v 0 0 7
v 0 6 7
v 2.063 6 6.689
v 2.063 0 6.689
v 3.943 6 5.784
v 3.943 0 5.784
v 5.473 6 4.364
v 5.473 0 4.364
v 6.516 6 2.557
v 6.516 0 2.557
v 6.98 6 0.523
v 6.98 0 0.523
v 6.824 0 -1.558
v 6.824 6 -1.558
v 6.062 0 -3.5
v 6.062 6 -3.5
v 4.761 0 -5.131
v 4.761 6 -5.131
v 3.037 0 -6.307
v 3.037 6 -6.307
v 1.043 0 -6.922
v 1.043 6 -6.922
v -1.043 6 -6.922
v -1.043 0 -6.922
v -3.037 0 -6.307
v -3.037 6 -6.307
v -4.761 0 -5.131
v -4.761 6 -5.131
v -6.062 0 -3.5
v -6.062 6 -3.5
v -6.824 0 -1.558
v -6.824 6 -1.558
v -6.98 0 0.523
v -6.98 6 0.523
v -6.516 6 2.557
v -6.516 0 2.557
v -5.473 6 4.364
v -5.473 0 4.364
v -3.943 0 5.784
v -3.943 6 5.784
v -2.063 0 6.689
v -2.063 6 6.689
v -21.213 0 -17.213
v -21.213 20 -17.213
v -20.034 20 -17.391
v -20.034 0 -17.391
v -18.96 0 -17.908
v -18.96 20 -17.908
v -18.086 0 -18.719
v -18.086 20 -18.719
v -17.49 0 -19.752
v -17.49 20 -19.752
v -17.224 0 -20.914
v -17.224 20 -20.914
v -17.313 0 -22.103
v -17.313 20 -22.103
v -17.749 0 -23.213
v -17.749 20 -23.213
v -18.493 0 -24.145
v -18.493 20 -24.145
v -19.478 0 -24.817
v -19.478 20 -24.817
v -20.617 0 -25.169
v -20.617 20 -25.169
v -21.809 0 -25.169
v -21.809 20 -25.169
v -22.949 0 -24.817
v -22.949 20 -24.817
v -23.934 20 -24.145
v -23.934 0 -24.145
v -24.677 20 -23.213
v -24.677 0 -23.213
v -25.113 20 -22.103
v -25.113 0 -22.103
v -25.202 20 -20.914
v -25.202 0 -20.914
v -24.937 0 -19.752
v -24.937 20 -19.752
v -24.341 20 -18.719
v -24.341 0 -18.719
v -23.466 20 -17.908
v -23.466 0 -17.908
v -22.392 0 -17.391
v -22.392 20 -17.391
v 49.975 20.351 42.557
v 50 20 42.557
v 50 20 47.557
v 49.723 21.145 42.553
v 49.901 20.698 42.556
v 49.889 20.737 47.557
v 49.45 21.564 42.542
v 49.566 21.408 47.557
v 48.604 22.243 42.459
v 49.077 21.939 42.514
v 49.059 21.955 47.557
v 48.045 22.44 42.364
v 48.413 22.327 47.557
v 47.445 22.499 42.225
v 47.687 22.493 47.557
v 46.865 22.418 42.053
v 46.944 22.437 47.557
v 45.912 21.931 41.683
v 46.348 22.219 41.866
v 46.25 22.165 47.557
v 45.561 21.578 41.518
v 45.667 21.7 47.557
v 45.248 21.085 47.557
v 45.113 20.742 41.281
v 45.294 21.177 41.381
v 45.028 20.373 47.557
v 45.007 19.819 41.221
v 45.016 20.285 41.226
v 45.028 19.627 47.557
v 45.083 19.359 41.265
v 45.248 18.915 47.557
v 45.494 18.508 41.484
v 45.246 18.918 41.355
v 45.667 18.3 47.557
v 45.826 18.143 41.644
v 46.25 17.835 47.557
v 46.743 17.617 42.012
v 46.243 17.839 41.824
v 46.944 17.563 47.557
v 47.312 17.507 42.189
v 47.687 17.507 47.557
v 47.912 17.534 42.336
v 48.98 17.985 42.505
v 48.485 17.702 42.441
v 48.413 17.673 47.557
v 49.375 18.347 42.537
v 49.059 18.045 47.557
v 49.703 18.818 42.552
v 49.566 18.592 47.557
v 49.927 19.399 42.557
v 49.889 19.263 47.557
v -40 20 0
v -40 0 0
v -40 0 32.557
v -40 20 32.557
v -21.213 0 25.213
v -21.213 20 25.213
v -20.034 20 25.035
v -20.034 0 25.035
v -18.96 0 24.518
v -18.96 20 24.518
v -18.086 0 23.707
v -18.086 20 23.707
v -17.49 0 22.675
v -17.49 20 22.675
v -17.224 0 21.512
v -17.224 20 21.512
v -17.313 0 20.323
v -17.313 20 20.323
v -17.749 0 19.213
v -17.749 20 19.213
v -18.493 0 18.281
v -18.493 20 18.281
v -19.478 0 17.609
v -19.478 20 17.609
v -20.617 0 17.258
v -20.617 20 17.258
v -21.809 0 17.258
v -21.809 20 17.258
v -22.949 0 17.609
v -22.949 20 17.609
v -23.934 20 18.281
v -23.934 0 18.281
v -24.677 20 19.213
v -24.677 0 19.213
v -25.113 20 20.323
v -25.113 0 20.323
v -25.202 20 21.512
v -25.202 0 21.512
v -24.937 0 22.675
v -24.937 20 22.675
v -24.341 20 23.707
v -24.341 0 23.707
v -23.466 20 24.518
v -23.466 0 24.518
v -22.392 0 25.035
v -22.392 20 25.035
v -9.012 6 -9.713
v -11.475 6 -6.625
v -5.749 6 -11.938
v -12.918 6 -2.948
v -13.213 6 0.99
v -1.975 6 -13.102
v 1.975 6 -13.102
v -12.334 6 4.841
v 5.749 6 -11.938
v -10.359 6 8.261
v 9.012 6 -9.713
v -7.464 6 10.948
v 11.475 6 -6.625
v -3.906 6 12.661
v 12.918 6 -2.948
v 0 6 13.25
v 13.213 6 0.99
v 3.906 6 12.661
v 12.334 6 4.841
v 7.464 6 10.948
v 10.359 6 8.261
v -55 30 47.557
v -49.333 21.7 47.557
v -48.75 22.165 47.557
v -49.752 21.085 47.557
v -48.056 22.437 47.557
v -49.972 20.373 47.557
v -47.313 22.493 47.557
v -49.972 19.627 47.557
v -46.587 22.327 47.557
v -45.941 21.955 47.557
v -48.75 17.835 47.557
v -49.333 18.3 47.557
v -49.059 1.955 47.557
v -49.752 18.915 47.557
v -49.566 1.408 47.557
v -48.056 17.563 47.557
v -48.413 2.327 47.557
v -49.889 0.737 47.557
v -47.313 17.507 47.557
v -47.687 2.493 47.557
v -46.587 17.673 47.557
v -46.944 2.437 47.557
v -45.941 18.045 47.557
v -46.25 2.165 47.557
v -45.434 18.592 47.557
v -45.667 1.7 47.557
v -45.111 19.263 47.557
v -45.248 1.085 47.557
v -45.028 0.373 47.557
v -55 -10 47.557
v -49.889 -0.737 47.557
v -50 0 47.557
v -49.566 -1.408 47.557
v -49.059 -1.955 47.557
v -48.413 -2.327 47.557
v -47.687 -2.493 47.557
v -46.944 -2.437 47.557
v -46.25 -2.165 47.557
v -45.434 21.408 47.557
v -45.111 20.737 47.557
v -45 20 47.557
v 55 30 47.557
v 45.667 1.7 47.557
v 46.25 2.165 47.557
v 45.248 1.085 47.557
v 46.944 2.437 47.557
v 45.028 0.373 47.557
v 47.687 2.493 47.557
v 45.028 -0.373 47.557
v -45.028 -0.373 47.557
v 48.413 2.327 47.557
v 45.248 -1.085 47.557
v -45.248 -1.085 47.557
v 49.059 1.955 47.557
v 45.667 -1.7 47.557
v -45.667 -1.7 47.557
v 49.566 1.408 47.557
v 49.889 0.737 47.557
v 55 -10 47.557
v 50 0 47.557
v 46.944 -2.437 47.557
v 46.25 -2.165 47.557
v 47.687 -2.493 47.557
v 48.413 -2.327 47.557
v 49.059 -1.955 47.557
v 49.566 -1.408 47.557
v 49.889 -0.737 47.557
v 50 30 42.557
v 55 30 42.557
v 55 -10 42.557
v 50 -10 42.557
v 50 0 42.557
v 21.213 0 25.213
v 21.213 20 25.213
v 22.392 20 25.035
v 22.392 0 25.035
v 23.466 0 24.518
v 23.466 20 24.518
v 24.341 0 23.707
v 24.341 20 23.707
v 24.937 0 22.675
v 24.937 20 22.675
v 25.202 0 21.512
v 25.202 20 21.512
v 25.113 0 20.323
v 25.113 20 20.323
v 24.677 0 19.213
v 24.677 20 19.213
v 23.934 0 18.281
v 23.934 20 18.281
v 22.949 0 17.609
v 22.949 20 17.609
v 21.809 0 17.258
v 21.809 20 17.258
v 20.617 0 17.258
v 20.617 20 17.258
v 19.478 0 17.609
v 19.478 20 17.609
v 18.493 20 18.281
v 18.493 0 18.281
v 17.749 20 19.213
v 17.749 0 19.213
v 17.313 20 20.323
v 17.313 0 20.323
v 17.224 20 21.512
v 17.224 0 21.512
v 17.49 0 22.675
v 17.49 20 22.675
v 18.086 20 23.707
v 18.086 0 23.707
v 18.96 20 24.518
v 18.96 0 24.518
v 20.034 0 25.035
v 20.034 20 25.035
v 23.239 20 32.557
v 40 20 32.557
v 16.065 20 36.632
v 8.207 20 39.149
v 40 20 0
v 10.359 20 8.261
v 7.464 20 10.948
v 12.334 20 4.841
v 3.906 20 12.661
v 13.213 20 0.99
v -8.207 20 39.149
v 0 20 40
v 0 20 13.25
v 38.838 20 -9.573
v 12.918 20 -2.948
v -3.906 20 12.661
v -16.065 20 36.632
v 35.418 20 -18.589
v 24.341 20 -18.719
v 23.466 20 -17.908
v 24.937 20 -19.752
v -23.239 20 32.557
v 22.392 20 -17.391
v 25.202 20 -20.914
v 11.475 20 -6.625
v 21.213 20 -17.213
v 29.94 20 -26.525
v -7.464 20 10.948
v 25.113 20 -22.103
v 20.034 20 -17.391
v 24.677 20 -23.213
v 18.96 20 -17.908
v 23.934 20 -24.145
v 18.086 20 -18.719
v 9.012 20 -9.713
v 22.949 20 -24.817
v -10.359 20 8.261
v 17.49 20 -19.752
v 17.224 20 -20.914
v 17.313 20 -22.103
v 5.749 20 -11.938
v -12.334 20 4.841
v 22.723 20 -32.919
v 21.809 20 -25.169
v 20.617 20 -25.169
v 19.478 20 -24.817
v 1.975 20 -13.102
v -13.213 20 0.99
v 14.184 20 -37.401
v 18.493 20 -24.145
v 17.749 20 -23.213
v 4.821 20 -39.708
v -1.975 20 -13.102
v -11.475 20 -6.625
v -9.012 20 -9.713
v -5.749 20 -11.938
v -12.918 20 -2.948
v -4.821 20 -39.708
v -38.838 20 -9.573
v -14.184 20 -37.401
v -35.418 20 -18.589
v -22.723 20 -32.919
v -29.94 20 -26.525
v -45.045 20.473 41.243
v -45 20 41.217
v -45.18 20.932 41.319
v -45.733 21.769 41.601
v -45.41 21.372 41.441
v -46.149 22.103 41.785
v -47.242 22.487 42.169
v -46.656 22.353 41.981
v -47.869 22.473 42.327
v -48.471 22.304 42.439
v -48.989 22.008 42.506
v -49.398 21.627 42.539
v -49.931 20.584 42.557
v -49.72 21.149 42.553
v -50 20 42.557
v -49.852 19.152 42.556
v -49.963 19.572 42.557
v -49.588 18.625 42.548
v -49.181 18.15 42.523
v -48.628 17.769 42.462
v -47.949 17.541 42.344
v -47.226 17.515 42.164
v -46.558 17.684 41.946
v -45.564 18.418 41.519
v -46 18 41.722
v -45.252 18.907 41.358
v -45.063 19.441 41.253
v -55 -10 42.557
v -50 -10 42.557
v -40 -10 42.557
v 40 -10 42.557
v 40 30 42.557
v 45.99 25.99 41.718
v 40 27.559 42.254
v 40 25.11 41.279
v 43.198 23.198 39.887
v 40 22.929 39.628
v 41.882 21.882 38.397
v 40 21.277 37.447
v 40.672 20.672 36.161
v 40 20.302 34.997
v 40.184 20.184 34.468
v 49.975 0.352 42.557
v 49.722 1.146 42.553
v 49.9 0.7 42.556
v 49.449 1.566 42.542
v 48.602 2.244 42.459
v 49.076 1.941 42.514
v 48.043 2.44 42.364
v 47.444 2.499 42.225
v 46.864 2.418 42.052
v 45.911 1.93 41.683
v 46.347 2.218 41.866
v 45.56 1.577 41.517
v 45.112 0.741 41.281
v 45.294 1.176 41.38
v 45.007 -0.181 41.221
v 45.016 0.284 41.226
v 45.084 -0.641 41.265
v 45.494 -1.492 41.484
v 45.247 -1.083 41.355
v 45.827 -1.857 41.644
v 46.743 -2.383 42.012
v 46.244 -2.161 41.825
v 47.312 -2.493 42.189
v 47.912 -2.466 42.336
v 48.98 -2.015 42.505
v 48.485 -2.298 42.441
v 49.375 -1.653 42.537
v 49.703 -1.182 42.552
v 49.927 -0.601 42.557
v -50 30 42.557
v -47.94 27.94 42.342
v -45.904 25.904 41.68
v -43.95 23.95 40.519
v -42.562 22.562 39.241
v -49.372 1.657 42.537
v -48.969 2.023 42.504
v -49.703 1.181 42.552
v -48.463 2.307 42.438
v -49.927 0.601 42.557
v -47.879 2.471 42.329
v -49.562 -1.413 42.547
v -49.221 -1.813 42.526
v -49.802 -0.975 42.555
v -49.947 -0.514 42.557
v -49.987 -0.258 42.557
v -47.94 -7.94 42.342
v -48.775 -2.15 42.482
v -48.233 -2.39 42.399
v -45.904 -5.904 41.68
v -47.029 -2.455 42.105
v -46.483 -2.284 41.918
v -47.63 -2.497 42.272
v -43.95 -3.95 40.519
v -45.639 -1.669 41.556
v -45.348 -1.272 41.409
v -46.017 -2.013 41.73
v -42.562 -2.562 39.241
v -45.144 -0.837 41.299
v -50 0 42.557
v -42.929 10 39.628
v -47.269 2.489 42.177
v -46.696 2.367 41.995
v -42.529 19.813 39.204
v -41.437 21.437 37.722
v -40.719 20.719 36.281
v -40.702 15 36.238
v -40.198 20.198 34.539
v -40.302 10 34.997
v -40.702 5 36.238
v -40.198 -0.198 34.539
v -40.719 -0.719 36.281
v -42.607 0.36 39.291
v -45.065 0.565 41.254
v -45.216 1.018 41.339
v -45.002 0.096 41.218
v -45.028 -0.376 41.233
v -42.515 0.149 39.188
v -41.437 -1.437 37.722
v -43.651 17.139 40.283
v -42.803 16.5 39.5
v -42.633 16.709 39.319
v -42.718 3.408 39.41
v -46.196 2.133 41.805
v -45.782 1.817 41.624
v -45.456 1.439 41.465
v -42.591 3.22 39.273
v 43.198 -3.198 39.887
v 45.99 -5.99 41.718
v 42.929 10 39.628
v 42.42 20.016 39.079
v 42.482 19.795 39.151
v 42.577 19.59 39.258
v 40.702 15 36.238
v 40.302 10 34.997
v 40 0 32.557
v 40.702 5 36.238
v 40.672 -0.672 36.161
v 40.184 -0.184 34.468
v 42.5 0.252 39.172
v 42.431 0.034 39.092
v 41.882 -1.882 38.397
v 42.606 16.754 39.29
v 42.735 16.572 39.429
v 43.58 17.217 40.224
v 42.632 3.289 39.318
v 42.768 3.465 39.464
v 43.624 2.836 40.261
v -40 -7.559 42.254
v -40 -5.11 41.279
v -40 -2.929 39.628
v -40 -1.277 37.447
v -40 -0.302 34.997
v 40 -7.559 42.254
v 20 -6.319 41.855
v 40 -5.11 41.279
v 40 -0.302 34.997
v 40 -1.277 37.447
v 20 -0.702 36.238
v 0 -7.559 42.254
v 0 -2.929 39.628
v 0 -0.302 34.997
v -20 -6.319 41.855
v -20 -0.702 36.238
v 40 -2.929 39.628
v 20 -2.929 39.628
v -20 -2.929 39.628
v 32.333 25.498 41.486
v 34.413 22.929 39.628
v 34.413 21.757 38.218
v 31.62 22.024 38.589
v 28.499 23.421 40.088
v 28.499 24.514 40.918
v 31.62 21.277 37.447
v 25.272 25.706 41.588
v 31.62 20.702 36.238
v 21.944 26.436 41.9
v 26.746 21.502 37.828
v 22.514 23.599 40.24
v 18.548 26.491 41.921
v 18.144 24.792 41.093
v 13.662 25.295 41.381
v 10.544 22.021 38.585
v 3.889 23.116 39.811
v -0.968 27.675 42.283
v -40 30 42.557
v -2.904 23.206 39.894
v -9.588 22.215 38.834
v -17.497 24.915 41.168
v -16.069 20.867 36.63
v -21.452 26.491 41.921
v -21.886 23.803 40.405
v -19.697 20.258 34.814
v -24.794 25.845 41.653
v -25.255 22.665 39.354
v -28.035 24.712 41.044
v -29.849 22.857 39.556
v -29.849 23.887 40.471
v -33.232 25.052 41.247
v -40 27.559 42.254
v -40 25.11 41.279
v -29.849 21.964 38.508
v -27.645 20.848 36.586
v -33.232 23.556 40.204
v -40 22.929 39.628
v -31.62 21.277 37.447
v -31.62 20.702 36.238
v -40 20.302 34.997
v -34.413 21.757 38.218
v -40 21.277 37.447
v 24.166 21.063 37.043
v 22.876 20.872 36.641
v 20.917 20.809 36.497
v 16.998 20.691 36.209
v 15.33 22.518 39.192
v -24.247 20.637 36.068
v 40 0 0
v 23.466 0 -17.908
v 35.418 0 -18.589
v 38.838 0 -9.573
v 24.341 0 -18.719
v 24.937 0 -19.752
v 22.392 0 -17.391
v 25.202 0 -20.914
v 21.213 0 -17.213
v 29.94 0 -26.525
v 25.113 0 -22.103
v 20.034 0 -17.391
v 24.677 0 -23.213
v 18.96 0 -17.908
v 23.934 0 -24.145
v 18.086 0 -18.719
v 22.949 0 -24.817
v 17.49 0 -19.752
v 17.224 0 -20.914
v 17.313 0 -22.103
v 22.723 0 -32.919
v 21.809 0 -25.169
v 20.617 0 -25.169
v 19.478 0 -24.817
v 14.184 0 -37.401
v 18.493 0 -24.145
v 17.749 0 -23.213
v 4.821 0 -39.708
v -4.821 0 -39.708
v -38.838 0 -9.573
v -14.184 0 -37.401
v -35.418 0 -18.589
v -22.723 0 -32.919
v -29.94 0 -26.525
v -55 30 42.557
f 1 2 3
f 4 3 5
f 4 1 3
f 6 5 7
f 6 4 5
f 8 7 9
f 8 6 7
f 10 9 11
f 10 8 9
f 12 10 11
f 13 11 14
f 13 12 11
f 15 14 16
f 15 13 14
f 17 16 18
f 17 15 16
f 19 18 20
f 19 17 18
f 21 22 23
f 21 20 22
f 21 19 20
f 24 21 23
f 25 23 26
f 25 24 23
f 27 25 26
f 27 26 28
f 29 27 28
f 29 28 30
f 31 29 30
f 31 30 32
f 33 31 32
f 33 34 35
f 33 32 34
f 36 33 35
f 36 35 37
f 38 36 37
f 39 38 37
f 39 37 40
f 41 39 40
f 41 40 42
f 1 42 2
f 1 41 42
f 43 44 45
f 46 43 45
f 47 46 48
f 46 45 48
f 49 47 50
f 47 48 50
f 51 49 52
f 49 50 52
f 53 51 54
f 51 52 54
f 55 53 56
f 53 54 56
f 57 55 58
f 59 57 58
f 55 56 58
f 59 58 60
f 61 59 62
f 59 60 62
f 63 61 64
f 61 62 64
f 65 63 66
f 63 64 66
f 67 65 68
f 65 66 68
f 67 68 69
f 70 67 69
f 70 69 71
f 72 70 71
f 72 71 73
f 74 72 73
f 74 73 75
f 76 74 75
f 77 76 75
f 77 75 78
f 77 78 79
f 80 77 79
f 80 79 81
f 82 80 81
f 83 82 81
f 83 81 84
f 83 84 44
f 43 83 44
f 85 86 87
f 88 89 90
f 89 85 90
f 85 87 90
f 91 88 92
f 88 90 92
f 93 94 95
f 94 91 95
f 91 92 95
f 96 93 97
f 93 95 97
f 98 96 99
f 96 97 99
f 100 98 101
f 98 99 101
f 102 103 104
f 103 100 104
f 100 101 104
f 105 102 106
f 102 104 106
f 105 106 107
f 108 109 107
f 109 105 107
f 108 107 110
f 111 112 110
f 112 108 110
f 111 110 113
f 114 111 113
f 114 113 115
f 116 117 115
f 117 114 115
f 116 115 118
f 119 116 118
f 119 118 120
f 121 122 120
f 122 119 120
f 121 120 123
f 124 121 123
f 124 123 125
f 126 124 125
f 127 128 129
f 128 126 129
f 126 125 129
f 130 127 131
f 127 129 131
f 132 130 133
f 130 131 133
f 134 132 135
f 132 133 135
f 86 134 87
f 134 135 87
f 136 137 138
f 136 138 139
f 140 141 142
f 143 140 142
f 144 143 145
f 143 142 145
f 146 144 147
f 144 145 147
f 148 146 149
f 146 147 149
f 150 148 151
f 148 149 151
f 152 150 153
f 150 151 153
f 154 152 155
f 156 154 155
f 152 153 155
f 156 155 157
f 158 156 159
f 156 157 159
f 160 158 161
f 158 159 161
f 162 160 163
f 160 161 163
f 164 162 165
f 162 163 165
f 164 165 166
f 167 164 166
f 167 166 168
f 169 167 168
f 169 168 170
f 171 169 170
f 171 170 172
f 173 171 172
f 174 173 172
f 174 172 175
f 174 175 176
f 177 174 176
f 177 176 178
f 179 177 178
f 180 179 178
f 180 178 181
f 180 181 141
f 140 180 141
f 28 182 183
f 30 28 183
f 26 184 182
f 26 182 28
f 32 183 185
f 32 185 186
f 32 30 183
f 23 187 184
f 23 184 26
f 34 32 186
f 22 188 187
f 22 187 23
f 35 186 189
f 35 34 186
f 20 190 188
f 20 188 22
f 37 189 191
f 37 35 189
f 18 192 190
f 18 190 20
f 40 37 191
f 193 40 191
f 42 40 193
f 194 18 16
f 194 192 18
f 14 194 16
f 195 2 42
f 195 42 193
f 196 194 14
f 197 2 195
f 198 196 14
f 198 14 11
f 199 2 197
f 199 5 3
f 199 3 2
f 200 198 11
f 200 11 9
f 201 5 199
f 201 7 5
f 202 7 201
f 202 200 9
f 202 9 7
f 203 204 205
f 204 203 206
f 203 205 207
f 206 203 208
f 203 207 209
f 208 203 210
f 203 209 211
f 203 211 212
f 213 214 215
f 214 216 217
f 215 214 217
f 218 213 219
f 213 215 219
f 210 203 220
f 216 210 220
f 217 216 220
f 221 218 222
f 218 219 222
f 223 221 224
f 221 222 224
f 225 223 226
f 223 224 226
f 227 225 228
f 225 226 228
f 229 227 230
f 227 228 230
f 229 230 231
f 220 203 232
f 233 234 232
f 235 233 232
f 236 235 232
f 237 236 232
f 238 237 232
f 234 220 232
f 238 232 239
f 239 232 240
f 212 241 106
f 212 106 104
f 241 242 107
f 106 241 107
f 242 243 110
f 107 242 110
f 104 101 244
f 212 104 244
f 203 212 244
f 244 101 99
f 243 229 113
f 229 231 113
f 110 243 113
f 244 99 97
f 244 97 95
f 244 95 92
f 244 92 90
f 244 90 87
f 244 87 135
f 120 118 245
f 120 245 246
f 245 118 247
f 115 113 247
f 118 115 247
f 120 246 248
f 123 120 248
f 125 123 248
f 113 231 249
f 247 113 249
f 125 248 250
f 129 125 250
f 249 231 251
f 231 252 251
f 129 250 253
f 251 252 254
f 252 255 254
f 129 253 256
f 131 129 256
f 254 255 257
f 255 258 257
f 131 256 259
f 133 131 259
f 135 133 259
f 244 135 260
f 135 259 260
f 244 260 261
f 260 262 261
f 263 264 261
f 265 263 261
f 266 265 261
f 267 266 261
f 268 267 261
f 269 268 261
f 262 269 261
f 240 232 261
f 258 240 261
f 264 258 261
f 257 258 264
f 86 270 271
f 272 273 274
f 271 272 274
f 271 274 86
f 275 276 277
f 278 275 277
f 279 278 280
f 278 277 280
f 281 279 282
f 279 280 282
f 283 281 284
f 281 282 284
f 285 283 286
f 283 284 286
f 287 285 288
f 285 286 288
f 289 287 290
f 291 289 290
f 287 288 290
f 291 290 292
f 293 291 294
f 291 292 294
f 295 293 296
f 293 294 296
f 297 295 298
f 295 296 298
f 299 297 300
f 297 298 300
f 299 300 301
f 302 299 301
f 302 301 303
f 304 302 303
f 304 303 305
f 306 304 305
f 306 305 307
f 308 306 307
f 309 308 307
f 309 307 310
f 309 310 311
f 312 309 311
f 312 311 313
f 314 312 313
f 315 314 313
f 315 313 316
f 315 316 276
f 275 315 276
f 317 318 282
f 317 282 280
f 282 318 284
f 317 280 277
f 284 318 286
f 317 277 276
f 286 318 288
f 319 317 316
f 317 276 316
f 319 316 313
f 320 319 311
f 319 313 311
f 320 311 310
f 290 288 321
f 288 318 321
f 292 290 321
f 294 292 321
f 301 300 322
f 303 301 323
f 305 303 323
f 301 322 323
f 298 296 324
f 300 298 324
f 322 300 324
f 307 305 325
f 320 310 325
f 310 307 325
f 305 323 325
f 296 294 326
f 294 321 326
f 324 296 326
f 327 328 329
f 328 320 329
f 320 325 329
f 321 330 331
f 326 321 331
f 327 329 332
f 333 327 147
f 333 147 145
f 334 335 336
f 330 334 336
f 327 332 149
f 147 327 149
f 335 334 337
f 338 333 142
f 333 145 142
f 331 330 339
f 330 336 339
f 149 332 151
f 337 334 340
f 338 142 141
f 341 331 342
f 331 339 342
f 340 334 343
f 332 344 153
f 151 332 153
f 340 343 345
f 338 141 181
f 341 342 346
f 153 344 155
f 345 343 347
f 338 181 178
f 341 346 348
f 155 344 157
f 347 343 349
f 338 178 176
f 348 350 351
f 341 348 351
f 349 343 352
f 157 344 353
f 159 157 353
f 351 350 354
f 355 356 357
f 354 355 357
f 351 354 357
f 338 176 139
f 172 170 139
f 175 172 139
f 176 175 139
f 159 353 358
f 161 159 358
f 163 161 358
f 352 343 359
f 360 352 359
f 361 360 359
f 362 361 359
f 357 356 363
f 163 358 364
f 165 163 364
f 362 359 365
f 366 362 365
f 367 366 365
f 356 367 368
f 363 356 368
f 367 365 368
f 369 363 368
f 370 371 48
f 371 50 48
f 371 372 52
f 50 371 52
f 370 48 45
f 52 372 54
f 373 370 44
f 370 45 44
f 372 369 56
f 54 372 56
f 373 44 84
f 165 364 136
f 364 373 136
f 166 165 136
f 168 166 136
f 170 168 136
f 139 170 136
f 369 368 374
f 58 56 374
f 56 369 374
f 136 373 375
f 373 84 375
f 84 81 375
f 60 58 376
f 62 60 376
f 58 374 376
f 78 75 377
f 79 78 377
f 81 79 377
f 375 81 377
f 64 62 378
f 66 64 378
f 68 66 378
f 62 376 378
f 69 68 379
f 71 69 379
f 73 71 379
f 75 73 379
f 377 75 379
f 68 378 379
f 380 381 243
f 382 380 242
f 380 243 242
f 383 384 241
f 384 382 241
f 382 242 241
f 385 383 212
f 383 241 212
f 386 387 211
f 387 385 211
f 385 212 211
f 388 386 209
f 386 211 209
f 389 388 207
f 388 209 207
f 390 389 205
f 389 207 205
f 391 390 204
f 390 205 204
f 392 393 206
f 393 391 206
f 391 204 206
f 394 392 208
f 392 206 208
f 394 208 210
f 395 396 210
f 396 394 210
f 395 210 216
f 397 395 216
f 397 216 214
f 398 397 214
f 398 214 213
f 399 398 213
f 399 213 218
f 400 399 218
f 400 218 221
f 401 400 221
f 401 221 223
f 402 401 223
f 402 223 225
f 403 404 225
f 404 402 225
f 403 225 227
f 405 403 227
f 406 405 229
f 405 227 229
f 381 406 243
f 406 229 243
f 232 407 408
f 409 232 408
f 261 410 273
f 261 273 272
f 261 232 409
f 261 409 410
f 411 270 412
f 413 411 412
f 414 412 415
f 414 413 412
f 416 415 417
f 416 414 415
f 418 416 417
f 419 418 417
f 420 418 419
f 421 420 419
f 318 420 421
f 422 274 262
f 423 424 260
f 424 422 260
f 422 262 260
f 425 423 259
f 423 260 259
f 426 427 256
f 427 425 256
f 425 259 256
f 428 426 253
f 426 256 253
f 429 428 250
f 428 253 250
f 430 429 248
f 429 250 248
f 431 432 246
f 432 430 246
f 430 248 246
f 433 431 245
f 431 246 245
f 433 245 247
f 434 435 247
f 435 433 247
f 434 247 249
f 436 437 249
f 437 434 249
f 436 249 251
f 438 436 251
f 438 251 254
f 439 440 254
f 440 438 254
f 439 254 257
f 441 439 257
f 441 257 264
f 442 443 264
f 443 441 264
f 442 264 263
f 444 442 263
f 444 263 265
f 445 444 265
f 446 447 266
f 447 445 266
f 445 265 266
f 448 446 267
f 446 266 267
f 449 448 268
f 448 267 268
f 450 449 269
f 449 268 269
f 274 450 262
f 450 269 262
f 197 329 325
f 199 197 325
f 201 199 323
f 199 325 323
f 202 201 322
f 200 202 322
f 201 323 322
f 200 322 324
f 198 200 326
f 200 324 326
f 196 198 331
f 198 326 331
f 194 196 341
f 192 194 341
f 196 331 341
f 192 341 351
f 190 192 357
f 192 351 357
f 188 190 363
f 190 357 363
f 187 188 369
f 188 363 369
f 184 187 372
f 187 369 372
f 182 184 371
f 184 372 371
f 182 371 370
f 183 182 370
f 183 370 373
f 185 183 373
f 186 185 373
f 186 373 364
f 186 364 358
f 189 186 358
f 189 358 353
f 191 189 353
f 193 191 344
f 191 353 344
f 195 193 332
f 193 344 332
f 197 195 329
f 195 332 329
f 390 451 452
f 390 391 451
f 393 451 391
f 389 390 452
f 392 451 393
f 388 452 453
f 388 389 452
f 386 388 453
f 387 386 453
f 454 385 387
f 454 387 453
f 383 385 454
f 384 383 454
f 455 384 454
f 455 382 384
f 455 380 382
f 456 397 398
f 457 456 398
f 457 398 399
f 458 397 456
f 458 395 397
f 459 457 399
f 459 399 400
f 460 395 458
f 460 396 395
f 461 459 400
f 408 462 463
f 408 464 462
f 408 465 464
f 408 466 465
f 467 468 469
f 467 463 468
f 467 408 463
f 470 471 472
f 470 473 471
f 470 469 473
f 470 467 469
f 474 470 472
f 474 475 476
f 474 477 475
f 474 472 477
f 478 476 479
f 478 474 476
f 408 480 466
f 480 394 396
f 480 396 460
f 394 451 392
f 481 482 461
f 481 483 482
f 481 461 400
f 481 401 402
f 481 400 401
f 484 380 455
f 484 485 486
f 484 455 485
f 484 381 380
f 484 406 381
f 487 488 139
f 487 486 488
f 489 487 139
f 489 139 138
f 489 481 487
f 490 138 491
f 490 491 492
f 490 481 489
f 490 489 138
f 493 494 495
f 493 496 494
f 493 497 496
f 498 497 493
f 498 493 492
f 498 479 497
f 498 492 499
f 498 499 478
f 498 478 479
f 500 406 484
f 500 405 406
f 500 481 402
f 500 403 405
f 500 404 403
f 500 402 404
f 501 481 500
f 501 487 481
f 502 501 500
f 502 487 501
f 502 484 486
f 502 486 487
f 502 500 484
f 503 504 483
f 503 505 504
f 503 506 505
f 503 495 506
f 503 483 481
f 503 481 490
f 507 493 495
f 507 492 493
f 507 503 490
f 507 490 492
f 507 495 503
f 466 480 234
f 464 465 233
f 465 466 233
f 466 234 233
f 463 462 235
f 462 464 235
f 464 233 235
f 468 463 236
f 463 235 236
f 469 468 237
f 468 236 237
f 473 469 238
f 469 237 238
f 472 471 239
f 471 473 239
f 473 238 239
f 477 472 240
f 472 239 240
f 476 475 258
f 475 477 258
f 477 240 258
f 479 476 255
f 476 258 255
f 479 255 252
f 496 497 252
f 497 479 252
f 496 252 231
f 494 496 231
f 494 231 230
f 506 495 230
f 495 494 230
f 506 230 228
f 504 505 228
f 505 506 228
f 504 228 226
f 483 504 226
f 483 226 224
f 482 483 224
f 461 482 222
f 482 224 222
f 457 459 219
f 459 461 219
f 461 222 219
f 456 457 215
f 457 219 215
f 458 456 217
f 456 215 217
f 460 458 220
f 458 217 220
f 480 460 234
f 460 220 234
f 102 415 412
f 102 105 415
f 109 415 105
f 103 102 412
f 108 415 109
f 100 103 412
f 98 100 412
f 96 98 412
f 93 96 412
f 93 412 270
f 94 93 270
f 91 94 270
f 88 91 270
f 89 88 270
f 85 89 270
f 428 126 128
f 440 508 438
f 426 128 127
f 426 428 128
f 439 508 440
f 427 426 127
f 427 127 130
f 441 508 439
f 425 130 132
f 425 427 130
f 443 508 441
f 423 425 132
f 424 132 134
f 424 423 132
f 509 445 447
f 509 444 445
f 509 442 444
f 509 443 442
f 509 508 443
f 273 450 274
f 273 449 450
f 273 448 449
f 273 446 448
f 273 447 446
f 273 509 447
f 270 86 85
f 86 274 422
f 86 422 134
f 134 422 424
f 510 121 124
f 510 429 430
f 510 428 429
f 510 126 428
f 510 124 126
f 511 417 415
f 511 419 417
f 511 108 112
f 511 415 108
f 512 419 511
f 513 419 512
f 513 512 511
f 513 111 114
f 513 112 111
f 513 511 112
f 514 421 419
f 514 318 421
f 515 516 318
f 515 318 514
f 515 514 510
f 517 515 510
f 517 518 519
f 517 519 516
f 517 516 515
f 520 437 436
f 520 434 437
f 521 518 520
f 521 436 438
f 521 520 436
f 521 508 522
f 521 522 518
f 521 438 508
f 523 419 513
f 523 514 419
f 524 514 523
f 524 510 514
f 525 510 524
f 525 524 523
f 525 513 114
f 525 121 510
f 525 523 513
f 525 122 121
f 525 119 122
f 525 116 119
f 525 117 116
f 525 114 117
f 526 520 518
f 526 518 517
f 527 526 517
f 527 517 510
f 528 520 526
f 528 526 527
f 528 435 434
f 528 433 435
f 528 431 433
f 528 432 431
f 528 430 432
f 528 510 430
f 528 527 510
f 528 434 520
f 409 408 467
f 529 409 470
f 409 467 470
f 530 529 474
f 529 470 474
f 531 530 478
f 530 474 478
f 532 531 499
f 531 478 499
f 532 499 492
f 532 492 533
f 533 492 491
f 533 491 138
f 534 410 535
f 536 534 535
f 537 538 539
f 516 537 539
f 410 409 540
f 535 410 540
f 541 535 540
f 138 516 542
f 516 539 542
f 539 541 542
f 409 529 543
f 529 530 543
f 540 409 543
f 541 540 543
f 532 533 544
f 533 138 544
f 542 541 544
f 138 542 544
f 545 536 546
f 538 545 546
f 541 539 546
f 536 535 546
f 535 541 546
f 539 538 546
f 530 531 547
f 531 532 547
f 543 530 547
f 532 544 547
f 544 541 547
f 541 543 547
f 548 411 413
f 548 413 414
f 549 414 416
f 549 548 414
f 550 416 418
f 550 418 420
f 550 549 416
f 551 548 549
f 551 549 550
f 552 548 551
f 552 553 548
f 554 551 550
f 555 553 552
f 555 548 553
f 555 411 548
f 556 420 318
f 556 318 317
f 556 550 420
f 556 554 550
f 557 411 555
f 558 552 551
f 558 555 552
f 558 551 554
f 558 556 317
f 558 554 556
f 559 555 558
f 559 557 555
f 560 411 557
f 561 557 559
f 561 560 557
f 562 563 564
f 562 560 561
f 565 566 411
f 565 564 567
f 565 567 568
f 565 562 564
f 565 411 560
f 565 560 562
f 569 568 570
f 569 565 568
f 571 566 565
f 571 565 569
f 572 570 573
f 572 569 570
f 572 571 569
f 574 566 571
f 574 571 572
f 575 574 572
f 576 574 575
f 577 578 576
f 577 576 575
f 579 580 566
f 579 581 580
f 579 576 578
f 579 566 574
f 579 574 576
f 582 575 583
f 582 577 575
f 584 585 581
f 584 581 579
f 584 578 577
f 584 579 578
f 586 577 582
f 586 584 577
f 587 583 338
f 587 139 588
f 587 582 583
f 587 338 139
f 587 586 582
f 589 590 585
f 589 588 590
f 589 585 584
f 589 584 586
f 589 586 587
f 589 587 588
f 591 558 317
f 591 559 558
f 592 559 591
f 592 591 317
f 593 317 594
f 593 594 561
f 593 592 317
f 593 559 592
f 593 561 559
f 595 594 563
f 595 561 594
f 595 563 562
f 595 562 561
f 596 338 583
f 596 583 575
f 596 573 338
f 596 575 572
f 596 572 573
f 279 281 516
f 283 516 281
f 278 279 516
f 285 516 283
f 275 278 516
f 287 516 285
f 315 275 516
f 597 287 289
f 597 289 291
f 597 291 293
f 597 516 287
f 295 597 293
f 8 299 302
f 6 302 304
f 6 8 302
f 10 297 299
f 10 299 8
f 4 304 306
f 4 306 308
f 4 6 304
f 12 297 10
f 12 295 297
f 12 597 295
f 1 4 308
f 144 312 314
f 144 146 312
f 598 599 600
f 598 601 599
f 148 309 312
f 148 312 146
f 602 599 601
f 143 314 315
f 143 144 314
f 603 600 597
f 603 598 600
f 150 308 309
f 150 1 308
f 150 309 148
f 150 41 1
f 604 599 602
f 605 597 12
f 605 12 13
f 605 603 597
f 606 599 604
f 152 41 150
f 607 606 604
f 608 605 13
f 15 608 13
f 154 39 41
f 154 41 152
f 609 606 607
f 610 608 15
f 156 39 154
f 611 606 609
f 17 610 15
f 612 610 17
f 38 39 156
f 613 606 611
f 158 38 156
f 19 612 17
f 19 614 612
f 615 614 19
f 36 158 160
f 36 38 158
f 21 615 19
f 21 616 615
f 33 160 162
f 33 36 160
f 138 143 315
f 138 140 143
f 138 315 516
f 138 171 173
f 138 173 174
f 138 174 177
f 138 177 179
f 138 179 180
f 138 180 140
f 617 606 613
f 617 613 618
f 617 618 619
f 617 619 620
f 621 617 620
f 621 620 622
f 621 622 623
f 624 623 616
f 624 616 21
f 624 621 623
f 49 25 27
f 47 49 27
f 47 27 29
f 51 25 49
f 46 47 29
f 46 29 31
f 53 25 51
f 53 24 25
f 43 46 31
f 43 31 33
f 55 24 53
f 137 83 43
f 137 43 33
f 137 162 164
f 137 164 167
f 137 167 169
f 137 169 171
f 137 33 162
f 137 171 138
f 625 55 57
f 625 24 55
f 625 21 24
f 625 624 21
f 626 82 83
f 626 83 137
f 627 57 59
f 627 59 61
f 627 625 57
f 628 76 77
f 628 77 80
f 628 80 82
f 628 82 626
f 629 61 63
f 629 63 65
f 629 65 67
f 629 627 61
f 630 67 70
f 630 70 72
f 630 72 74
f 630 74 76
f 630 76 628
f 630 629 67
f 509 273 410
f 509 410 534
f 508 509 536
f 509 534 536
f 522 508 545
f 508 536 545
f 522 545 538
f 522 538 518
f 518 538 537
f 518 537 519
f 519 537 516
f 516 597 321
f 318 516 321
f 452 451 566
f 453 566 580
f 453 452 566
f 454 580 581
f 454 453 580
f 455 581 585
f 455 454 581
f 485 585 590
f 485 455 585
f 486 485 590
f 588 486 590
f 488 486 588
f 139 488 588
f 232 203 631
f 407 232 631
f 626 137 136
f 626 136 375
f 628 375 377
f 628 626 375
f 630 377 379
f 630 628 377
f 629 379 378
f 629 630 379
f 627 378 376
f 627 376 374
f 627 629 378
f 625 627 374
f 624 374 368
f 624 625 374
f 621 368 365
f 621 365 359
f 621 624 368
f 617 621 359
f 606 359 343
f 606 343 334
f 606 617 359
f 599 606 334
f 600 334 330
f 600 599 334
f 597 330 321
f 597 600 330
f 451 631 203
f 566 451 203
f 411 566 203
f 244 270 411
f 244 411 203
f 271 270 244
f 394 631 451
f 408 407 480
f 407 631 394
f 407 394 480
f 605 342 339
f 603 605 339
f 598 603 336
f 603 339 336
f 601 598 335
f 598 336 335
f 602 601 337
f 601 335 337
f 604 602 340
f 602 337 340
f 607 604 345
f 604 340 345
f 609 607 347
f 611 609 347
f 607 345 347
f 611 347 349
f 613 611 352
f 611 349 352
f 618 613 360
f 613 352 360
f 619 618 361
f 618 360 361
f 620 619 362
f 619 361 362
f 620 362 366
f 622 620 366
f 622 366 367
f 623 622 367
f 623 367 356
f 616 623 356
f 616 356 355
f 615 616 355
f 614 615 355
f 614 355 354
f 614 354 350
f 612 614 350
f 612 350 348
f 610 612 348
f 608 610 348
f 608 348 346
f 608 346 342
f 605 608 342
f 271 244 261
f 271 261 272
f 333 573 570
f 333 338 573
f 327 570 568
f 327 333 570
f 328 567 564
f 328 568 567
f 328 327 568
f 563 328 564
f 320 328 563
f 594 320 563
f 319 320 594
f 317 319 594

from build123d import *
from build123d.topology import SkipClean

# Parameters (mm, degrees)
SKETCH1_R           = 7
BOSS_EXTRUDE1_DEPTH = 20
SKETCH2_R           = 13.25
CUT_EXTRUDE1_DEPTH  = 14
SKETCH3_R           = 4
CUT_EXTRUDE2_DEPTH  = 76.40989747
SKETCH4_W           = 110
SKETCH4_H           = 5
BOSS_EXTRUDE2_DEPTH = 10
SKETCH5_W           = 110
SKETCH5_H           = 5
BOSS_EXTRUDE3_DEPTH = 10
FILLET1_START       = -40
FILLET1_DEPTH       = 80
FILLET1_START_2     = -10.0000001
FILLET1_2_DEPTH     = 40.0000001
FILLET1_START_3     = -55.0000001
FILLET1_3_DEPTH     = 110.0000002
SKETCH6_R           = 2.5
CUT_EXTRUDE4_DEPTH  = 108.662433145
SKETCH8_R           = 40
CUT_EXTRUDE5_DEPTH  = 79.655277385


with BuildPart() as part:
    # Sketch1 → Boss-Extrude1 (new body)
    with BuildSketch(Plane(origin=(0, 0, 0), x_dir=(1, 0, 0), z_dir=(0, 1, 0))):
        with BuildLine():
            Line((-55, -42.556835854), (-40, -42.556835854))
            Line((-40, -42.556835854), (-40, 0))
            ThreePointArc((-40, 0), (0, 40), (40, 0))
            Line((40, 0), (40, -42.556835854))
            Line((40, -42.556835854), (55, -42.556835854))
            Line((55, -42.556835854), (55, -47.556835854))
            Line((55, -47.556835854), (-55, -47.556835854))
            Line((-55, -47.556835854), (-55, -42.556835854))
        make_face()
        with Locations(Location((0, 0, 0), (0, 0, 270))):
            Circle(SKETCH1_R, mode=Mode.SUBTRACT)
    extrude(amount=BOSS_EXTRUDE1_DEPTH)

    # Sketch2 → Cut-Extrude1 (cut)
    with BuildSketch(Plane(origin=(0, 20, 0), x_dir=(1, 0, 0), z_dir=(0, 1, 0))):
        with Locations(Location((0, 0, 0), (0, 0, 270))):
            Circle(SKETCH2_R)
    extrude(amount=-CUT_EXTRUDE1_DEPTH, mode=Mode.SUBTRACT)

    # Sketch3 → Cut-Extrude2 (cut, through all)
    with BuildSketch(Plane(origin=(0, 20, 0), x_dir=(1, 0, 0), z_dir=(0, 1, 0))):
        with Locations(Location((-21.213203436, 21.213203436, 0), (0, 0, 270))):
            Circle(SKETCH3_R)
        with Locations(Location((21.213203436, 21.213203436, 0), (0, 0, 270))):
            Circle(SKETCH3_R)
        with Locations(Location((21.213203436, -21.213203436, 0), (0, 0, 270))):
            Circle(SKETCH3_R)
        with Locations(Location((-21.213203436, -21.213203436, 0), (0, 0, 270))):
            Circle(SKETCH3_R)
    extrude(amount=-CUT_EXTRUDE2_DEPTH, mode=Mode.SUBTRACT)

    # Sketch4 → Boss-Extrude2 (add)
    with BuildSketch(Plane.XZ):
        with Locations((0, 45.056835854)):
            Rectangle(SKETCH4_W, SKETCH4_H)
    extrude(amount=BOSS_EXTRUDE2_DEPTH)

    # Sketch5 → Boss-Extrude3 (add)
    with BuildSketch(Plane(origin=(0, 20, 0), x_dir=(1, 0, 0), z_dir=(0, 1, 0))):
        with Locations((0, -45.056835854)):
            Rectangle(SKETCH5_W, SKETCH5_H)
    extrude(amount=BOSS_EXTRUDE3_DEPTH)

    # Fillet1: read off the stored shape, not the designer's step
    # Fillet1 outline → Fillet1 (add)
    with BuildSketch(Plane.YZ.offset(FILLET1_START)):
        with BuildLine():
            Line((0, 42.556835854), (-10, 42.556835854))
            add(Edge.make_bspline(
                [(-10, 42.556835854), (0, 42.556835854), (0, 32.556835854)],
                knots=[0, 0, 0, 1, 1, 1], degree=2, weights=[1, 0.707106781, 1]))
            Line((0, 32.556835854), (0, 42.556835854))
        make_face()
        with BuildLine():
            Line((30, 42.556835854), (20, 42.556835854))
            Line((20, 42.556835854), (20, 32.556835854))
            add(Edge.make_bspline(
                [(30, 42.556835854), (20, 42.556835854), (20, 32.556835854)],
                knots=[0, 0, 0, 1, 1, 1], degree=2, weights=[1, 0.707106781, 1]))
        make_face()
    extrude(amount=FILLET1_DEPTH)

    # Fillet1 2 outline → Fillet1 2 (add)
    with SkipClean():  # the faces are left unmerged after this step: merging them gives an invalid solid
        with BuildSketch(Plane(origin=(0, 0, 0), x_dir=(1, 0, 0), z_dir=(0, 1, 0)).offset(FILLET1_START_2)):
            with BuildLine():
                add(Edge.make_bspline(
                    [(40, -32.556835854), (40, -42.556835854), (50, -42.556835854)],
                    knots=[0, 0, 0, 1, 1, 1], degree=2, weights=[1, 0.707106781, 1]))
                Line((40, -32.556835854), (40, -42.556835854))
                Line((40, -42.556835854), (50, -42.556835854))
            make_face()
            with BuildLine():
                add(Edge.make_bspline(
                    [(-50, -42.556835854), (-40, -42.556835854), (-40, -32.556835854)],
                    knots=[0, 0, 0, 1, 1, 1], degree=2, weights=[1, 0.707106781, 1]))
                Line((-50, -42.556835854), (-40, -42.556835854))
                Line((-40, -42.556835854), (-40, -32.556835854))
            make_face()
        extrude(amount=FILLET1_2_DEPTH)

    # Fillet1 3 outline → Fillet1 3 (cut)
    with BuildSketch(Plane.YZ.offset(FILLET1_START_3)):
        with BuildLine():
            Line((-10, 42.556835854), (-10.0000001, 32.556835854))
            Line((-10.0000001, 32.556835854), (0, 32.556835854))
            add(Edge.make_bspline(
                [(-10, 42.556835854), (0, 42.556835854), (0, 32.556835854)],
                knots=[0, 0, 0, 1, 1, 1], degree=2, weights=[1, 0.707106781, 1]))
        make_face()
        with BuildLine():
            add(Edge.make_bspline(
                [(30, 42.556835854), (20, 42.556835854), (20, 32.556835854)],
                knots=[0, 0, 0, 1, 1, 1], degree=2, weights=[1, 0.707106781, 1]))
            Line((20, 32.556835854), (30, 32.556835854))
            Line((30, 32.556835854), (30, 42.556835854))
        make_face()
    extrude(amount=FILLET1_3_DEPTH, mode=Mode.SUBTRACT)

    # Sketch6 → Cut-Extrude4 (cut, through all)
    with BuildSketch(Plane.XY.offset(47.556835854)):
        with Locations((-47.5, 20)):
            Circle(SKETCH6_R)
        with Locations(Location((-47.5, 0, 0), (0, 0, 180))):
            Circle(SKETCH6_R)
        with Locations((47.5, 0)):
            Circle(SKETCH6_R)
        with Locations((47.5, 20)):
            Circle(SKETCH6_R)
    extrude(amount=-CUT_EXTRUDE4_DEPTH, mode=Mode.SUBTRACT)

    # Sketch8 → Cut-Extrude5 (cut, through all)
    with BuildSketch(Plane(origin=(0, 20, 0), x_dir=(1, 0, 0), z_dir=(0, 1, 0))):
        Circle(SKETCH8_R)
    extrude(amount=CUT_EXTRUDE5_DEPTH, mode=Mode.SUBTRACT)


solid = part.part
